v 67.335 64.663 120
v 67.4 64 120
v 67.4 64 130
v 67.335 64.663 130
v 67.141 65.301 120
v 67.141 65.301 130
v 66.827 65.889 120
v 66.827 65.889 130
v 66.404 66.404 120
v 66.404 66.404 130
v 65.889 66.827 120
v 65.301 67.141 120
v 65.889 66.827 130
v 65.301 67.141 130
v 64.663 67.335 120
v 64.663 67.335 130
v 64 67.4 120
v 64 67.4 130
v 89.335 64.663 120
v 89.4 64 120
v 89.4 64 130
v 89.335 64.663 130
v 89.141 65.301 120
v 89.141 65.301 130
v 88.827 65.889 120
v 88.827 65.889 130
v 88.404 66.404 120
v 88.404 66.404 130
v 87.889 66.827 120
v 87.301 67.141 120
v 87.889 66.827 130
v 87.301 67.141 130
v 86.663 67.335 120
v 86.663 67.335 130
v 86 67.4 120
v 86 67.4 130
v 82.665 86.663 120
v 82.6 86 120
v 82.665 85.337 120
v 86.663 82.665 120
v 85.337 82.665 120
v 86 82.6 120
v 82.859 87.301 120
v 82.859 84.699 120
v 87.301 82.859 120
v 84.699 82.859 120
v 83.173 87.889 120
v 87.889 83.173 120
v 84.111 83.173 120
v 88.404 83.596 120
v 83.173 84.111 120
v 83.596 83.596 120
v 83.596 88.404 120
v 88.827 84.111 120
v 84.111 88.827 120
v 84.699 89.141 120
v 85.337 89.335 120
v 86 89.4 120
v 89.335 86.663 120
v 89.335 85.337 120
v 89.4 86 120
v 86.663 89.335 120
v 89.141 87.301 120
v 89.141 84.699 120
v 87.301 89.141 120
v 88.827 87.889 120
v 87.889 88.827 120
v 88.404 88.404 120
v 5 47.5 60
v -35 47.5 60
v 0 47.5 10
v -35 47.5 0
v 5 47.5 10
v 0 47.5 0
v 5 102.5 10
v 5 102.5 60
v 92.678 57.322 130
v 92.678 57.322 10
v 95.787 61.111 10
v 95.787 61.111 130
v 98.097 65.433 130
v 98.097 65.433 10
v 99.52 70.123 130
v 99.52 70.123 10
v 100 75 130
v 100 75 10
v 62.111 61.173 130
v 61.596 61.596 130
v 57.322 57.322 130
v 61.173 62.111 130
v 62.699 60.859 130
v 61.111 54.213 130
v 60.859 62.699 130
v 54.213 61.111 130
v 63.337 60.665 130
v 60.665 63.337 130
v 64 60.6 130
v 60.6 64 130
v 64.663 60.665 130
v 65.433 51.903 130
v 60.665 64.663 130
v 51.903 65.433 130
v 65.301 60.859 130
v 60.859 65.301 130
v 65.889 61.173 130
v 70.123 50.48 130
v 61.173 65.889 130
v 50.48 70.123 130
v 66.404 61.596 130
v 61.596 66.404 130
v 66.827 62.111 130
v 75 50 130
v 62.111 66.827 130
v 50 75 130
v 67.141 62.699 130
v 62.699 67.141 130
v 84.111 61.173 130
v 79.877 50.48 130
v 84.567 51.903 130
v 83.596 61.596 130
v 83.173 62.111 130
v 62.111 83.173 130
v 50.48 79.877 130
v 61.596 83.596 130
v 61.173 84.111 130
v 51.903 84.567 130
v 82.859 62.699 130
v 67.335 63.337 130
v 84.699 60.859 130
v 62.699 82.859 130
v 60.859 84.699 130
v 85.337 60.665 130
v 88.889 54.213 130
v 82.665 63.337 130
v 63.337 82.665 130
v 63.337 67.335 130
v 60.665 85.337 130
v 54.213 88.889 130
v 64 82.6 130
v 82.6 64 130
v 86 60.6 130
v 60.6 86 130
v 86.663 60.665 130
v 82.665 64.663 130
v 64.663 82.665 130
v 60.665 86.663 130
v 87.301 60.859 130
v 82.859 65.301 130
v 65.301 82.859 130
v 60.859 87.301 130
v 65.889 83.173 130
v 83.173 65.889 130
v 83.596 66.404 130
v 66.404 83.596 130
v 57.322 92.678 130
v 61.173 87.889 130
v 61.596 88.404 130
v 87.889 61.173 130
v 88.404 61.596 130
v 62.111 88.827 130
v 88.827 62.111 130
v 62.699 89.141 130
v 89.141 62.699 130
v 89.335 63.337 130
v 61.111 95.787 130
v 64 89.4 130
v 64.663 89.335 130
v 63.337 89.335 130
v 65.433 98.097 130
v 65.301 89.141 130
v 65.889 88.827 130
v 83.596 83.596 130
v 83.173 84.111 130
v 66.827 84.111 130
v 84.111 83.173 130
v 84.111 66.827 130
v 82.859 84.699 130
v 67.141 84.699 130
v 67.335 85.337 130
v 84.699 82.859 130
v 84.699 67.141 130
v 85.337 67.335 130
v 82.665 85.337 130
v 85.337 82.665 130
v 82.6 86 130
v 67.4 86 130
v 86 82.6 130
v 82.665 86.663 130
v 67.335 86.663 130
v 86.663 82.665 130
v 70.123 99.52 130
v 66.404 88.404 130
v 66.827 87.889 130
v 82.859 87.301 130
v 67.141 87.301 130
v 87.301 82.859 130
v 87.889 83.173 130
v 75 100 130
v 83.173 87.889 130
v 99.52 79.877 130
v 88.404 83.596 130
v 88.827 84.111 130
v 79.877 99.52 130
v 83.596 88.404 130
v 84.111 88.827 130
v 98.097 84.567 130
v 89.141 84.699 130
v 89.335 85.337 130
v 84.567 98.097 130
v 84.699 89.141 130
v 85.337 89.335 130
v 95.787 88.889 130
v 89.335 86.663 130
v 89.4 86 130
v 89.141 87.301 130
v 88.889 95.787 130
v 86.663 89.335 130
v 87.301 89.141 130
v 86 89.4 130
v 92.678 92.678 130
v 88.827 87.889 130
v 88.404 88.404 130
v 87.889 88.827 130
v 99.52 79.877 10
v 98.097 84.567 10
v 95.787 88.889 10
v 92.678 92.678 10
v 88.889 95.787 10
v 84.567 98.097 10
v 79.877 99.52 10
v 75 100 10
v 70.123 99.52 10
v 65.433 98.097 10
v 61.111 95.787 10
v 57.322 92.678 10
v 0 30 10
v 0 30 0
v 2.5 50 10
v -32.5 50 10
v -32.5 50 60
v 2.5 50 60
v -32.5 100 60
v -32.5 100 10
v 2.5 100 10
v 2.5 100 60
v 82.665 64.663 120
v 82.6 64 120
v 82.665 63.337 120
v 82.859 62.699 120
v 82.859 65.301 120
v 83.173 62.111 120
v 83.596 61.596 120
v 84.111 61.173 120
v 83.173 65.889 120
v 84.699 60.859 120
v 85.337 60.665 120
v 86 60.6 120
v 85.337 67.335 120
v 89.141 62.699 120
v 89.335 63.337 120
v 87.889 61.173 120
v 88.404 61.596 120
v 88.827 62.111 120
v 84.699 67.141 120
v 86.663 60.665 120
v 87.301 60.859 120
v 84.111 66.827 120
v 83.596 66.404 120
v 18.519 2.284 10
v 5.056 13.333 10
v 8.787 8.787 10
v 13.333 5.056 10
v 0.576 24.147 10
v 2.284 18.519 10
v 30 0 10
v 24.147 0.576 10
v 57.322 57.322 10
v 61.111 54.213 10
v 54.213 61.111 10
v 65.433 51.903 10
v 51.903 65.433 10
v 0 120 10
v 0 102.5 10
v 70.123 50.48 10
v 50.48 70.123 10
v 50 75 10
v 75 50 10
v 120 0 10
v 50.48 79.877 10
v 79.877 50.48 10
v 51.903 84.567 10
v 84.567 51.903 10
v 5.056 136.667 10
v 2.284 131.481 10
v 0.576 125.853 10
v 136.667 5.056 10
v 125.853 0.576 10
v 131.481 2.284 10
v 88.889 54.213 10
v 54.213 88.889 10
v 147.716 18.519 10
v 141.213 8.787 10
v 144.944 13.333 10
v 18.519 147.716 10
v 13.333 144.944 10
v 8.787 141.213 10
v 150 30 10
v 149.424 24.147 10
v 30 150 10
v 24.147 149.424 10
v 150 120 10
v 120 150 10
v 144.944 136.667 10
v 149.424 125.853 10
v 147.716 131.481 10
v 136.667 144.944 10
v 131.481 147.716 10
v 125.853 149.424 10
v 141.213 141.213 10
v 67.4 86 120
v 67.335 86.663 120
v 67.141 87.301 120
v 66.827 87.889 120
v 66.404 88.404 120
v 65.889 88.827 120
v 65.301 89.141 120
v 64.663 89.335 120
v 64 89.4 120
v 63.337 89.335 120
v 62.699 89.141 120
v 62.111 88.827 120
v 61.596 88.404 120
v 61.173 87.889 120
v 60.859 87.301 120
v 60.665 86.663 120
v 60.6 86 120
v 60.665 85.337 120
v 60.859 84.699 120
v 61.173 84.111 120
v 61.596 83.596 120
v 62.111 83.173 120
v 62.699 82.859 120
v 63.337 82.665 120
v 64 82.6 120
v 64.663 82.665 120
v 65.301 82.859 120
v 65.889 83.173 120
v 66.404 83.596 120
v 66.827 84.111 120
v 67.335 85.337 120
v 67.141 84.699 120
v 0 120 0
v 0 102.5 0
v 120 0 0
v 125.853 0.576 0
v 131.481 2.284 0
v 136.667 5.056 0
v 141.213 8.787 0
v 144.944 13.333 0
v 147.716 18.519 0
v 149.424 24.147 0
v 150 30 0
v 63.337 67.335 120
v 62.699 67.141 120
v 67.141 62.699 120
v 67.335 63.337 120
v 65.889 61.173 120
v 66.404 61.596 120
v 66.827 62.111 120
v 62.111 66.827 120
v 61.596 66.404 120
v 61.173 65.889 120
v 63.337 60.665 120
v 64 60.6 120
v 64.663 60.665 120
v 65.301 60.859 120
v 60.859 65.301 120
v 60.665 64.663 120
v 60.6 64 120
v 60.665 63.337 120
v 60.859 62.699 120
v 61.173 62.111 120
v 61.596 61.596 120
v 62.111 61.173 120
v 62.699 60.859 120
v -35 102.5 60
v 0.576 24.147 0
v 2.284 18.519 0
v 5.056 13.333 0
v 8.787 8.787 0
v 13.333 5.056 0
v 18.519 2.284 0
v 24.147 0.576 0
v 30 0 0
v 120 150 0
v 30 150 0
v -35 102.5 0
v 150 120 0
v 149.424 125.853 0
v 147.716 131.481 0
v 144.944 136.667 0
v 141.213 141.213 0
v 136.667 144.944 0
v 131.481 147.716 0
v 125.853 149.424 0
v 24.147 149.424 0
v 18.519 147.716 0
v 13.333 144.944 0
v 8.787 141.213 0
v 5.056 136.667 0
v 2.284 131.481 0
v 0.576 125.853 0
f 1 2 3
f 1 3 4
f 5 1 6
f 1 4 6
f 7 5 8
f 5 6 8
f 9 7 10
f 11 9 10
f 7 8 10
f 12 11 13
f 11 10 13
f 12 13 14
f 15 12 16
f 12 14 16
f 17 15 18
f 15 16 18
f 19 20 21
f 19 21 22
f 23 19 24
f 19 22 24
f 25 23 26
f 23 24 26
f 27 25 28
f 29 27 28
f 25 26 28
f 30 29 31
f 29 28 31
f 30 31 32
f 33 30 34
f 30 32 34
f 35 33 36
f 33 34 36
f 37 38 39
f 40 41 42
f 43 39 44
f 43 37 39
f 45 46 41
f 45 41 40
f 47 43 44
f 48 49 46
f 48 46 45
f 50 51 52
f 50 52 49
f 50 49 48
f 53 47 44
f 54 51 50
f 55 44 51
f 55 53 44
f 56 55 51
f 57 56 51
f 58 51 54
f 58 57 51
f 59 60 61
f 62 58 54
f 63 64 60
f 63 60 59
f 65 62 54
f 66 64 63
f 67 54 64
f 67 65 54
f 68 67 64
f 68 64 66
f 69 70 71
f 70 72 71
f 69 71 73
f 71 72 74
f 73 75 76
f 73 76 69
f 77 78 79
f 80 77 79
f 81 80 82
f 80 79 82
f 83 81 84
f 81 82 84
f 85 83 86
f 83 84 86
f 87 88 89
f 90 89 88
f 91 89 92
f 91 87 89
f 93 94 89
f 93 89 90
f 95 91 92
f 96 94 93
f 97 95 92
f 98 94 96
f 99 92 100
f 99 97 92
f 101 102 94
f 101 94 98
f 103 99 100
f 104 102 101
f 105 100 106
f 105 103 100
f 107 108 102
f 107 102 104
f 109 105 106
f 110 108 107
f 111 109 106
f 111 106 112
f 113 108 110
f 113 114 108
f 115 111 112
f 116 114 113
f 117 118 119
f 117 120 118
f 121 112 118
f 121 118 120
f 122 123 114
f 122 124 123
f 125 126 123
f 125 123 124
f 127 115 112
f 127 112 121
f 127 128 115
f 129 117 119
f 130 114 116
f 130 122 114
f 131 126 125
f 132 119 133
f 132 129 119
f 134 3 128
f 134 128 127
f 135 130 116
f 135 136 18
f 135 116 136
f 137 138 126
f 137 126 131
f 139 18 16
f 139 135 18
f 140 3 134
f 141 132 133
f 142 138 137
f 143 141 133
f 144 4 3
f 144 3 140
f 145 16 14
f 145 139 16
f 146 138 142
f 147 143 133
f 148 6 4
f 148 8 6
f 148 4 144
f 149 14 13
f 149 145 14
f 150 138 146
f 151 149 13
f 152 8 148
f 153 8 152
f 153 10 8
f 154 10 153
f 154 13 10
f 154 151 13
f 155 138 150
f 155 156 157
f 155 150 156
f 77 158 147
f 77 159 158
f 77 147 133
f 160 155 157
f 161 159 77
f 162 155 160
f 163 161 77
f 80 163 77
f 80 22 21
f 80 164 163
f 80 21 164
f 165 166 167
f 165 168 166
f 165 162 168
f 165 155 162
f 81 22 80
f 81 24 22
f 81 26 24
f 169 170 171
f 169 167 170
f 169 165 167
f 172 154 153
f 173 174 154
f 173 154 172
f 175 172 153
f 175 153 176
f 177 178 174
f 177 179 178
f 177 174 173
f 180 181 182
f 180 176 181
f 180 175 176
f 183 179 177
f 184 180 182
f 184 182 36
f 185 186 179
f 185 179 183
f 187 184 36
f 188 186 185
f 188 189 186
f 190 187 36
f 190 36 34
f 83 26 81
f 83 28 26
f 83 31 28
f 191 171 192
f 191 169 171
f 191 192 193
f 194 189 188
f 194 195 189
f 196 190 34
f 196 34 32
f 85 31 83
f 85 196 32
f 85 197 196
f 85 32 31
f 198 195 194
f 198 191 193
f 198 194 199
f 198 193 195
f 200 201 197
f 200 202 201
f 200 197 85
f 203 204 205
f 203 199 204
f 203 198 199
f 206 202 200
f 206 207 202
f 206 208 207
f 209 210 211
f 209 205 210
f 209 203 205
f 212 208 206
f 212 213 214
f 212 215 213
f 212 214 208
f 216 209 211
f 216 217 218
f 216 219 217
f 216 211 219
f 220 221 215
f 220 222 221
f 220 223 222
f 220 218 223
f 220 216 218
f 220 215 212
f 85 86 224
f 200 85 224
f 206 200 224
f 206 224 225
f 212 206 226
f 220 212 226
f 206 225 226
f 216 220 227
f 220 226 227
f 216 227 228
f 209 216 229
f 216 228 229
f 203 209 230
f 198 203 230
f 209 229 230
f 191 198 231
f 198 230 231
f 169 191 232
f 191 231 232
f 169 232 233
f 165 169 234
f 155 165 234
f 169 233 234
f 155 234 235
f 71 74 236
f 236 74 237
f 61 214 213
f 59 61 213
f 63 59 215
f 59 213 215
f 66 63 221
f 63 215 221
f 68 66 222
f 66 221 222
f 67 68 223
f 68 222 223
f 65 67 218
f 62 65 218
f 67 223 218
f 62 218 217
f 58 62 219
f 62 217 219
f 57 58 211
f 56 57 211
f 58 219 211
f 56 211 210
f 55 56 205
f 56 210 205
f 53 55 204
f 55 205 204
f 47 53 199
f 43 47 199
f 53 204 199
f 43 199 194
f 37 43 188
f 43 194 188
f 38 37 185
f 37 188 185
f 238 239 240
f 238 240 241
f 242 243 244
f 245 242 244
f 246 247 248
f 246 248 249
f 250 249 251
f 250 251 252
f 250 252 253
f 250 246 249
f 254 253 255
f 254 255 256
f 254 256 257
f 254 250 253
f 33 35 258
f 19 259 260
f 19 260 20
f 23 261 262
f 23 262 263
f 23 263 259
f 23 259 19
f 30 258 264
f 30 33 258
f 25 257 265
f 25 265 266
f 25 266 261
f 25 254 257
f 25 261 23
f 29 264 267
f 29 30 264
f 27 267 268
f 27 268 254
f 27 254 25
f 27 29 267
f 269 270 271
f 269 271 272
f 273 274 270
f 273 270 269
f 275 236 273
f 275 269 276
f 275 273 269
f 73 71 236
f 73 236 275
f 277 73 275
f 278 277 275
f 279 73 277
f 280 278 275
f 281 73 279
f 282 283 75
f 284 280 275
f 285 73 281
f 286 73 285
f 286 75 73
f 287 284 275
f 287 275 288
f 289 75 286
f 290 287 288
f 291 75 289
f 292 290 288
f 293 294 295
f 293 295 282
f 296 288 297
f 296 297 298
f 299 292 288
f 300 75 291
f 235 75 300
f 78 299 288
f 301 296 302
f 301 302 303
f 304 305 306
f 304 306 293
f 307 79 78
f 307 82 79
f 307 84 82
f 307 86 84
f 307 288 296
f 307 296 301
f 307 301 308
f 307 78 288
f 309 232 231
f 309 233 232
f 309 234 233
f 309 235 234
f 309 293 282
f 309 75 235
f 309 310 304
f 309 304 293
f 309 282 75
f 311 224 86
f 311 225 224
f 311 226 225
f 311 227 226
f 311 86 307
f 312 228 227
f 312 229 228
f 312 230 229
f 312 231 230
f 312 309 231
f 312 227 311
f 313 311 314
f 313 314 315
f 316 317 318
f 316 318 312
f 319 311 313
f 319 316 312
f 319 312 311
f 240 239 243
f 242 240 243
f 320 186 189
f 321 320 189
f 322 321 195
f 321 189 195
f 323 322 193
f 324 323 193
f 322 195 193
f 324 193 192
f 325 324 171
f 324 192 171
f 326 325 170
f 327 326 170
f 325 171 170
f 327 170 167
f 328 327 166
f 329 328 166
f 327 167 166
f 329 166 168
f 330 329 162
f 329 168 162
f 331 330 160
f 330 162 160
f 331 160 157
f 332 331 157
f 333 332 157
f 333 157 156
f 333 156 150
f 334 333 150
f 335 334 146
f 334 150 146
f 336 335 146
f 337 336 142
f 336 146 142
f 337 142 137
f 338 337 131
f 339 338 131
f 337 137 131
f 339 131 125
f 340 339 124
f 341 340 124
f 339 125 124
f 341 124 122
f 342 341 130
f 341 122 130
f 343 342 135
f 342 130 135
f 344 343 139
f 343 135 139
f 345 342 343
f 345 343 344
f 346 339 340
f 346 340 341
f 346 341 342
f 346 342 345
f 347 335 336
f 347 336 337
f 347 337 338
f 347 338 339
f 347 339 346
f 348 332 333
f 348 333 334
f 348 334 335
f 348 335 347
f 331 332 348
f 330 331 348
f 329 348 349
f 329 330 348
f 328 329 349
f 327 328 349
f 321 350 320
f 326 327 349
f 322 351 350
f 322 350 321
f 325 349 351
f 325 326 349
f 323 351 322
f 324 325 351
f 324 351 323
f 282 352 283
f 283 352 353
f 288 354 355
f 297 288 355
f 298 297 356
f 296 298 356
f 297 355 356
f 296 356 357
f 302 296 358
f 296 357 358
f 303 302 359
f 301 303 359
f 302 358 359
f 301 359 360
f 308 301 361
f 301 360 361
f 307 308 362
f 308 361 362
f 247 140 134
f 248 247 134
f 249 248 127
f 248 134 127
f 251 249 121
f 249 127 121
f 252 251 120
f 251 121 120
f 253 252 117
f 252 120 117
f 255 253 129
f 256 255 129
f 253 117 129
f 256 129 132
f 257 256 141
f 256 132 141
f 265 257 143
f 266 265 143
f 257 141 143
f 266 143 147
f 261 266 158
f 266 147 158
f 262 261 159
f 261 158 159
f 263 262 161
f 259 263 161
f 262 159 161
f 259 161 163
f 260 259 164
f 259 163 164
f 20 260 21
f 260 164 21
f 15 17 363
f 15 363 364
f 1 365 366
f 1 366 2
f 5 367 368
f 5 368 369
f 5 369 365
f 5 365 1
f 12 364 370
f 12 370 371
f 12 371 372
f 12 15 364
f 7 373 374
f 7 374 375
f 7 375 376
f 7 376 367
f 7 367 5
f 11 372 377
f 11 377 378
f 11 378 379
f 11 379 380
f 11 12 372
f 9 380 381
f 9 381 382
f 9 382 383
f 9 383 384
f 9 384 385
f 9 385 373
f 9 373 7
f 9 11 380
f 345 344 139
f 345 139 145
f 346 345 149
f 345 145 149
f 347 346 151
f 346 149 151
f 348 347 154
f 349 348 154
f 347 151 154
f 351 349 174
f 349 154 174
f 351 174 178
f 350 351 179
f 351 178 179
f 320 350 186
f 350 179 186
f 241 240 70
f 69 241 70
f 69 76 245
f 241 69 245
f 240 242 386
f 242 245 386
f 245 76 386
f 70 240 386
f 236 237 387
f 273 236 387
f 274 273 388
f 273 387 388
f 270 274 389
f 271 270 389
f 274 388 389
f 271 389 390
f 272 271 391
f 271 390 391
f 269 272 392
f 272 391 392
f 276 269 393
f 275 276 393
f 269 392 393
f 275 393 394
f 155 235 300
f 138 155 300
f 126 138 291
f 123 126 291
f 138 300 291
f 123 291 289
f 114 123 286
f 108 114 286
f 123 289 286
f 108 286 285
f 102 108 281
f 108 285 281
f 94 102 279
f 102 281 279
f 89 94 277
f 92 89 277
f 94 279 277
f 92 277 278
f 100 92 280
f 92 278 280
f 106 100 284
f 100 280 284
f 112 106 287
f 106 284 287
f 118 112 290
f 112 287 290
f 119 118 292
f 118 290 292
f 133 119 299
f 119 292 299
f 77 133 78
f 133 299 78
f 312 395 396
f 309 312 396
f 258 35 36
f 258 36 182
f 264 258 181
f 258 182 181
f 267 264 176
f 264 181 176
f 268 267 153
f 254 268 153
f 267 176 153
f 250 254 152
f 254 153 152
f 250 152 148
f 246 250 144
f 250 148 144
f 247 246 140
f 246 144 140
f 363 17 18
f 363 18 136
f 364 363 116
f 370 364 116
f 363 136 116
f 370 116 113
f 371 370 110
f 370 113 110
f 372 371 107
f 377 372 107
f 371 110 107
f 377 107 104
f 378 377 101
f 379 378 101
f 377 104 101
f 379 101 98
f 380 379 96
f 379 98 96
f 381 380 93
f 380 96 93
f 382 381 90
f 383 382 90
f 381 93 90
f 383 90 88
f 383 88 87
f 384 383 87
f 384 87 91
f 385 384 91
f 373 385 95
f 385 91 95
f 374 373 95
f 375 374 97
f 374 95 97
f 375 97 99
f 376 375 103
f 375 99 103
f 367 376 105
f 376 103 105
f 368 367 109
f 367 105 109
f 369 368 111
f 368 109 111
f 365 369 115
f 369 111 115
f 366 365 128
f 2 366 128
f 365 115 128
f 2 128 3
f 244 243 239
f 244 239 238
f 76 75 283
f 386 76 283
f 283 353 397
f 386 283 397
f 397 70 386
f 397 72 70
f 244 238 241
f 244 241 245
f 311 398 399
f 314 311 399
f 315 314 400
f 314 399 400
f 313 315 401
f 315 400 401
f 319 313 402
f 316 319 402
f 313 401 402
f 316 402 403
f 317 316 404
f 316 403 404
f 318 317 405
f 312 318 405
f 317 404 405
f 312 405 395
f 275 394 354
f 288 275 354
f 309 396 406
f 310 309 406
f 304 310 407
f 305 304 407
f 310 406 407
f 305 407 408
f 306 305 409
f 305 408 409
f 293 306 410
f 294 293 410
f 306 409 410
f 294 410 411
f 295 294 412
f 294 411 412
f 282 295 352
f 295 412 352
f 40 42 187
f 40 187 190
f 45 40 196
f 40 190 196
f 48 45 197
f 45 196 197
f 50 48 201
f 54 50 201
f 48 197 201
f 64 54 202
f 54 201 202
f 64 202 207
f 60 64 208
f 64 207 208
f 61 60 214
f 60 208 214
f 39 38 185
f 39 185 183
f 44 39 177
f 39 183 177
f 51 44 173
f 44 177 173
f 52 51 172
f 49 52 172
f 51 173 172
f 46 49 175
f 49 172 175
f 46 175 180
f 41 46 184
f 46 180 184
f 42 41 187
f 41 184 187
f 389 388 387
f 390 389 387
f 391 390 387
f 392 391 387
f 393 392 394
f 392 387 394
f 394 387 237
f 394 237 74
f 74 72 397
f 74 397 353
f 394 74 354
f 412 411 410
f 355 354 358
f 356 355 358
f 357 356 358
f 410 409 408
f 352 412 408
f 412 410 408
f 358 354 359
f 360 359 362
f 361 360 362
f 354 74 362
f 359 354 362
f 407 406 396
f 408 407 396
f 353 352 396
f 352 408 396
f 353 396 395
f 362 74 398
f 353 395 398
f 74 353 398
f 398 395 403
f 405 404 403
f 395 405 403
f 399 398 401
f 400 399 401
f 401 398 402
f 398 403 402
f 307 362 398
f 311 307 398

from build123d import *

# Parameters (mm, degrees)
EXTRUDE_1_DEPTH     = 10
EXTRUDE_2_DEPTH     = 120
CUT_EXTRUDE_1_DEPTH = 10
EXTRUDE_3_DEPTH     = 10
SKETCH_8_W          = 35
SKETCH_8_H          = 50
EXTRUDE_4_DEPTH     = 50


with BuildPart() as part:
    # 草图1 → 凸台-拉伸1 (new body)
    with BuildSketch(Plane.XY):
        with BuildLine():
            Line((30, 0), (120, 0))
            ThreePointArc((120, 0), (141.213203436, 8.786796564), (150, 30))
            Line((150, 30), (150, 120))
            ThreePointArc((150, 120), (141.213203436, 141.213203436), (120, 150))
            Line((120, 150), (30, 150))
            ThreePointArc((30, 150), (8.786796564, 141.213203436), (0, 120))
            Line((0, 120), (0, 30))
            ThreePointArc((0, 30), (8.786796564, 8.786796564), (30, 0))
        make_face()
    extrude(amount=EXTRUDE_1_DEPTH)

    # 草图2 → 凸台-拉伸2 (add)
    with BuildSketch(Plane.XY.offset(10)):
        with BuildLine():
            ThreePointArc((100, 75), (84.567085809, 98.096988313), (57.32233047, 92.67766953))
            Line((57.32233047, 92.67766953), (92.67766953, 57.32233047))
            ThreePointArc((92.67766953, 57.32233047), (98.096988313, 65.432914191), (100, 75))
        make_face()
        with BuildLine():
            Line((92.67766953, 57.32233047), (57.32233047, 92.67766953))
            ThreePointArc((57.32233047, 92.67766953), (57.32233047, 57.32233047), (92.67766953, 57.32233047))
        make_face()
    extrude(amount=EXTRUDE_2_DEPTH)

    # 草图5 → 切除-拉伸1 (cut)
    with BuildSketch(Plane.XY.offset(130)):
        with BuildLine():
            ThreePointArc((67.4, 86), (61.595836944, 88.404163056), (64, 82.6))
            Line((64, 82.6), (64, 86))
            Line((64, 86), (67.4, 86))
        make_face()
        with BuildLine():
            Line((64, 86), (64, 82.6))
            ThreePointArc((64, 82.6), (66.404163056, 83.595836944), (67.4, 86))
            Line((67.4, 86), (64, 86))
        make_face()
        with BuildLine():
            Line((64, 67.4), (64, 64))
            Line((64, 64), (67.4, 64))
            ThreePointArc((67.4, 64), (66.404163056, 66.404163056), (64, 67.4))
        make_face()
        with BuildLine():
            Line((67.4, 64), (64, 64))
            Line((64, 64), (64, 67.4))
            ThreePointArc((64, 67.4), (61.595836944, 61.595836944), (67.4, 64))
        make_face()
        with BuildLine():
            ThreePointArc((86, 67.4), (83.595836944, 66.404163056), (82.6, 64))
            Line((82.6, 64), (86, 64))
            Line((86, 64), (86, 67.4))
        make_face()
        with BuildLine():
            Line((86, 64), (82.6, 64))
            ThreePointArc((82.6, 64), (86, 60.6), (89.4, 64))
            ThreePointArc((89.4, 64), (88.404163056, 66.404163056), (86, 67.4))
            Line((86, 67.4), (86, 64))
        make_face()
        with BuildLine():
            ThreePointArc((82.6, 86), (83.595836944, 83.595836944), (86, 82.6))
            Line((86, 82.6), (86, 86))
            Line((86, 86), (82.6, 86))
        make_face()
        with BuildLine():
            Line((86, 86), (86, 82.6))
            ThreePointArc((86, 82.6), (88.404163056, 83.595836944), (89.4, 86))
            ThreePointArc((89.4, 86), (86, 89.4), (82.6, 86))
            Line((82.6, 86), (86, 86))
        make_face()
    extrude(amount=-CUT_EXTRUDE_1_DEPTH, mode=Mode.SUBTRACT)

    # 草图7 → 凸台-拉伸3 (add, through all)
    with BuildSketch(Plane.XY.offset(10)):
        Polygon((0, 102.5), (-35, 102.5), (-35, 47.5), (0, 47.5), (0, 75), align=None)
    extrude(amount=-EXTRUDE_3_DEPTH)

    # 草图8 → 凸台-拉伸4 (add)
    with BuildSketch(Plane.XY.offset(10)):
        Polygon((-35, 102.5), (0, 102.5), (5, 102.5), (5, 47.5), (0, 47.5), (-35, 47.5), align=None)
        with Locations((-15, 75)):
            Rectangle(SKETCH_8_W, SKETCH_8_H, mode=Mode.SUBTRACT)
    extrude(amount=EXTRUDE_4_DEPTH)


solid = part.part
